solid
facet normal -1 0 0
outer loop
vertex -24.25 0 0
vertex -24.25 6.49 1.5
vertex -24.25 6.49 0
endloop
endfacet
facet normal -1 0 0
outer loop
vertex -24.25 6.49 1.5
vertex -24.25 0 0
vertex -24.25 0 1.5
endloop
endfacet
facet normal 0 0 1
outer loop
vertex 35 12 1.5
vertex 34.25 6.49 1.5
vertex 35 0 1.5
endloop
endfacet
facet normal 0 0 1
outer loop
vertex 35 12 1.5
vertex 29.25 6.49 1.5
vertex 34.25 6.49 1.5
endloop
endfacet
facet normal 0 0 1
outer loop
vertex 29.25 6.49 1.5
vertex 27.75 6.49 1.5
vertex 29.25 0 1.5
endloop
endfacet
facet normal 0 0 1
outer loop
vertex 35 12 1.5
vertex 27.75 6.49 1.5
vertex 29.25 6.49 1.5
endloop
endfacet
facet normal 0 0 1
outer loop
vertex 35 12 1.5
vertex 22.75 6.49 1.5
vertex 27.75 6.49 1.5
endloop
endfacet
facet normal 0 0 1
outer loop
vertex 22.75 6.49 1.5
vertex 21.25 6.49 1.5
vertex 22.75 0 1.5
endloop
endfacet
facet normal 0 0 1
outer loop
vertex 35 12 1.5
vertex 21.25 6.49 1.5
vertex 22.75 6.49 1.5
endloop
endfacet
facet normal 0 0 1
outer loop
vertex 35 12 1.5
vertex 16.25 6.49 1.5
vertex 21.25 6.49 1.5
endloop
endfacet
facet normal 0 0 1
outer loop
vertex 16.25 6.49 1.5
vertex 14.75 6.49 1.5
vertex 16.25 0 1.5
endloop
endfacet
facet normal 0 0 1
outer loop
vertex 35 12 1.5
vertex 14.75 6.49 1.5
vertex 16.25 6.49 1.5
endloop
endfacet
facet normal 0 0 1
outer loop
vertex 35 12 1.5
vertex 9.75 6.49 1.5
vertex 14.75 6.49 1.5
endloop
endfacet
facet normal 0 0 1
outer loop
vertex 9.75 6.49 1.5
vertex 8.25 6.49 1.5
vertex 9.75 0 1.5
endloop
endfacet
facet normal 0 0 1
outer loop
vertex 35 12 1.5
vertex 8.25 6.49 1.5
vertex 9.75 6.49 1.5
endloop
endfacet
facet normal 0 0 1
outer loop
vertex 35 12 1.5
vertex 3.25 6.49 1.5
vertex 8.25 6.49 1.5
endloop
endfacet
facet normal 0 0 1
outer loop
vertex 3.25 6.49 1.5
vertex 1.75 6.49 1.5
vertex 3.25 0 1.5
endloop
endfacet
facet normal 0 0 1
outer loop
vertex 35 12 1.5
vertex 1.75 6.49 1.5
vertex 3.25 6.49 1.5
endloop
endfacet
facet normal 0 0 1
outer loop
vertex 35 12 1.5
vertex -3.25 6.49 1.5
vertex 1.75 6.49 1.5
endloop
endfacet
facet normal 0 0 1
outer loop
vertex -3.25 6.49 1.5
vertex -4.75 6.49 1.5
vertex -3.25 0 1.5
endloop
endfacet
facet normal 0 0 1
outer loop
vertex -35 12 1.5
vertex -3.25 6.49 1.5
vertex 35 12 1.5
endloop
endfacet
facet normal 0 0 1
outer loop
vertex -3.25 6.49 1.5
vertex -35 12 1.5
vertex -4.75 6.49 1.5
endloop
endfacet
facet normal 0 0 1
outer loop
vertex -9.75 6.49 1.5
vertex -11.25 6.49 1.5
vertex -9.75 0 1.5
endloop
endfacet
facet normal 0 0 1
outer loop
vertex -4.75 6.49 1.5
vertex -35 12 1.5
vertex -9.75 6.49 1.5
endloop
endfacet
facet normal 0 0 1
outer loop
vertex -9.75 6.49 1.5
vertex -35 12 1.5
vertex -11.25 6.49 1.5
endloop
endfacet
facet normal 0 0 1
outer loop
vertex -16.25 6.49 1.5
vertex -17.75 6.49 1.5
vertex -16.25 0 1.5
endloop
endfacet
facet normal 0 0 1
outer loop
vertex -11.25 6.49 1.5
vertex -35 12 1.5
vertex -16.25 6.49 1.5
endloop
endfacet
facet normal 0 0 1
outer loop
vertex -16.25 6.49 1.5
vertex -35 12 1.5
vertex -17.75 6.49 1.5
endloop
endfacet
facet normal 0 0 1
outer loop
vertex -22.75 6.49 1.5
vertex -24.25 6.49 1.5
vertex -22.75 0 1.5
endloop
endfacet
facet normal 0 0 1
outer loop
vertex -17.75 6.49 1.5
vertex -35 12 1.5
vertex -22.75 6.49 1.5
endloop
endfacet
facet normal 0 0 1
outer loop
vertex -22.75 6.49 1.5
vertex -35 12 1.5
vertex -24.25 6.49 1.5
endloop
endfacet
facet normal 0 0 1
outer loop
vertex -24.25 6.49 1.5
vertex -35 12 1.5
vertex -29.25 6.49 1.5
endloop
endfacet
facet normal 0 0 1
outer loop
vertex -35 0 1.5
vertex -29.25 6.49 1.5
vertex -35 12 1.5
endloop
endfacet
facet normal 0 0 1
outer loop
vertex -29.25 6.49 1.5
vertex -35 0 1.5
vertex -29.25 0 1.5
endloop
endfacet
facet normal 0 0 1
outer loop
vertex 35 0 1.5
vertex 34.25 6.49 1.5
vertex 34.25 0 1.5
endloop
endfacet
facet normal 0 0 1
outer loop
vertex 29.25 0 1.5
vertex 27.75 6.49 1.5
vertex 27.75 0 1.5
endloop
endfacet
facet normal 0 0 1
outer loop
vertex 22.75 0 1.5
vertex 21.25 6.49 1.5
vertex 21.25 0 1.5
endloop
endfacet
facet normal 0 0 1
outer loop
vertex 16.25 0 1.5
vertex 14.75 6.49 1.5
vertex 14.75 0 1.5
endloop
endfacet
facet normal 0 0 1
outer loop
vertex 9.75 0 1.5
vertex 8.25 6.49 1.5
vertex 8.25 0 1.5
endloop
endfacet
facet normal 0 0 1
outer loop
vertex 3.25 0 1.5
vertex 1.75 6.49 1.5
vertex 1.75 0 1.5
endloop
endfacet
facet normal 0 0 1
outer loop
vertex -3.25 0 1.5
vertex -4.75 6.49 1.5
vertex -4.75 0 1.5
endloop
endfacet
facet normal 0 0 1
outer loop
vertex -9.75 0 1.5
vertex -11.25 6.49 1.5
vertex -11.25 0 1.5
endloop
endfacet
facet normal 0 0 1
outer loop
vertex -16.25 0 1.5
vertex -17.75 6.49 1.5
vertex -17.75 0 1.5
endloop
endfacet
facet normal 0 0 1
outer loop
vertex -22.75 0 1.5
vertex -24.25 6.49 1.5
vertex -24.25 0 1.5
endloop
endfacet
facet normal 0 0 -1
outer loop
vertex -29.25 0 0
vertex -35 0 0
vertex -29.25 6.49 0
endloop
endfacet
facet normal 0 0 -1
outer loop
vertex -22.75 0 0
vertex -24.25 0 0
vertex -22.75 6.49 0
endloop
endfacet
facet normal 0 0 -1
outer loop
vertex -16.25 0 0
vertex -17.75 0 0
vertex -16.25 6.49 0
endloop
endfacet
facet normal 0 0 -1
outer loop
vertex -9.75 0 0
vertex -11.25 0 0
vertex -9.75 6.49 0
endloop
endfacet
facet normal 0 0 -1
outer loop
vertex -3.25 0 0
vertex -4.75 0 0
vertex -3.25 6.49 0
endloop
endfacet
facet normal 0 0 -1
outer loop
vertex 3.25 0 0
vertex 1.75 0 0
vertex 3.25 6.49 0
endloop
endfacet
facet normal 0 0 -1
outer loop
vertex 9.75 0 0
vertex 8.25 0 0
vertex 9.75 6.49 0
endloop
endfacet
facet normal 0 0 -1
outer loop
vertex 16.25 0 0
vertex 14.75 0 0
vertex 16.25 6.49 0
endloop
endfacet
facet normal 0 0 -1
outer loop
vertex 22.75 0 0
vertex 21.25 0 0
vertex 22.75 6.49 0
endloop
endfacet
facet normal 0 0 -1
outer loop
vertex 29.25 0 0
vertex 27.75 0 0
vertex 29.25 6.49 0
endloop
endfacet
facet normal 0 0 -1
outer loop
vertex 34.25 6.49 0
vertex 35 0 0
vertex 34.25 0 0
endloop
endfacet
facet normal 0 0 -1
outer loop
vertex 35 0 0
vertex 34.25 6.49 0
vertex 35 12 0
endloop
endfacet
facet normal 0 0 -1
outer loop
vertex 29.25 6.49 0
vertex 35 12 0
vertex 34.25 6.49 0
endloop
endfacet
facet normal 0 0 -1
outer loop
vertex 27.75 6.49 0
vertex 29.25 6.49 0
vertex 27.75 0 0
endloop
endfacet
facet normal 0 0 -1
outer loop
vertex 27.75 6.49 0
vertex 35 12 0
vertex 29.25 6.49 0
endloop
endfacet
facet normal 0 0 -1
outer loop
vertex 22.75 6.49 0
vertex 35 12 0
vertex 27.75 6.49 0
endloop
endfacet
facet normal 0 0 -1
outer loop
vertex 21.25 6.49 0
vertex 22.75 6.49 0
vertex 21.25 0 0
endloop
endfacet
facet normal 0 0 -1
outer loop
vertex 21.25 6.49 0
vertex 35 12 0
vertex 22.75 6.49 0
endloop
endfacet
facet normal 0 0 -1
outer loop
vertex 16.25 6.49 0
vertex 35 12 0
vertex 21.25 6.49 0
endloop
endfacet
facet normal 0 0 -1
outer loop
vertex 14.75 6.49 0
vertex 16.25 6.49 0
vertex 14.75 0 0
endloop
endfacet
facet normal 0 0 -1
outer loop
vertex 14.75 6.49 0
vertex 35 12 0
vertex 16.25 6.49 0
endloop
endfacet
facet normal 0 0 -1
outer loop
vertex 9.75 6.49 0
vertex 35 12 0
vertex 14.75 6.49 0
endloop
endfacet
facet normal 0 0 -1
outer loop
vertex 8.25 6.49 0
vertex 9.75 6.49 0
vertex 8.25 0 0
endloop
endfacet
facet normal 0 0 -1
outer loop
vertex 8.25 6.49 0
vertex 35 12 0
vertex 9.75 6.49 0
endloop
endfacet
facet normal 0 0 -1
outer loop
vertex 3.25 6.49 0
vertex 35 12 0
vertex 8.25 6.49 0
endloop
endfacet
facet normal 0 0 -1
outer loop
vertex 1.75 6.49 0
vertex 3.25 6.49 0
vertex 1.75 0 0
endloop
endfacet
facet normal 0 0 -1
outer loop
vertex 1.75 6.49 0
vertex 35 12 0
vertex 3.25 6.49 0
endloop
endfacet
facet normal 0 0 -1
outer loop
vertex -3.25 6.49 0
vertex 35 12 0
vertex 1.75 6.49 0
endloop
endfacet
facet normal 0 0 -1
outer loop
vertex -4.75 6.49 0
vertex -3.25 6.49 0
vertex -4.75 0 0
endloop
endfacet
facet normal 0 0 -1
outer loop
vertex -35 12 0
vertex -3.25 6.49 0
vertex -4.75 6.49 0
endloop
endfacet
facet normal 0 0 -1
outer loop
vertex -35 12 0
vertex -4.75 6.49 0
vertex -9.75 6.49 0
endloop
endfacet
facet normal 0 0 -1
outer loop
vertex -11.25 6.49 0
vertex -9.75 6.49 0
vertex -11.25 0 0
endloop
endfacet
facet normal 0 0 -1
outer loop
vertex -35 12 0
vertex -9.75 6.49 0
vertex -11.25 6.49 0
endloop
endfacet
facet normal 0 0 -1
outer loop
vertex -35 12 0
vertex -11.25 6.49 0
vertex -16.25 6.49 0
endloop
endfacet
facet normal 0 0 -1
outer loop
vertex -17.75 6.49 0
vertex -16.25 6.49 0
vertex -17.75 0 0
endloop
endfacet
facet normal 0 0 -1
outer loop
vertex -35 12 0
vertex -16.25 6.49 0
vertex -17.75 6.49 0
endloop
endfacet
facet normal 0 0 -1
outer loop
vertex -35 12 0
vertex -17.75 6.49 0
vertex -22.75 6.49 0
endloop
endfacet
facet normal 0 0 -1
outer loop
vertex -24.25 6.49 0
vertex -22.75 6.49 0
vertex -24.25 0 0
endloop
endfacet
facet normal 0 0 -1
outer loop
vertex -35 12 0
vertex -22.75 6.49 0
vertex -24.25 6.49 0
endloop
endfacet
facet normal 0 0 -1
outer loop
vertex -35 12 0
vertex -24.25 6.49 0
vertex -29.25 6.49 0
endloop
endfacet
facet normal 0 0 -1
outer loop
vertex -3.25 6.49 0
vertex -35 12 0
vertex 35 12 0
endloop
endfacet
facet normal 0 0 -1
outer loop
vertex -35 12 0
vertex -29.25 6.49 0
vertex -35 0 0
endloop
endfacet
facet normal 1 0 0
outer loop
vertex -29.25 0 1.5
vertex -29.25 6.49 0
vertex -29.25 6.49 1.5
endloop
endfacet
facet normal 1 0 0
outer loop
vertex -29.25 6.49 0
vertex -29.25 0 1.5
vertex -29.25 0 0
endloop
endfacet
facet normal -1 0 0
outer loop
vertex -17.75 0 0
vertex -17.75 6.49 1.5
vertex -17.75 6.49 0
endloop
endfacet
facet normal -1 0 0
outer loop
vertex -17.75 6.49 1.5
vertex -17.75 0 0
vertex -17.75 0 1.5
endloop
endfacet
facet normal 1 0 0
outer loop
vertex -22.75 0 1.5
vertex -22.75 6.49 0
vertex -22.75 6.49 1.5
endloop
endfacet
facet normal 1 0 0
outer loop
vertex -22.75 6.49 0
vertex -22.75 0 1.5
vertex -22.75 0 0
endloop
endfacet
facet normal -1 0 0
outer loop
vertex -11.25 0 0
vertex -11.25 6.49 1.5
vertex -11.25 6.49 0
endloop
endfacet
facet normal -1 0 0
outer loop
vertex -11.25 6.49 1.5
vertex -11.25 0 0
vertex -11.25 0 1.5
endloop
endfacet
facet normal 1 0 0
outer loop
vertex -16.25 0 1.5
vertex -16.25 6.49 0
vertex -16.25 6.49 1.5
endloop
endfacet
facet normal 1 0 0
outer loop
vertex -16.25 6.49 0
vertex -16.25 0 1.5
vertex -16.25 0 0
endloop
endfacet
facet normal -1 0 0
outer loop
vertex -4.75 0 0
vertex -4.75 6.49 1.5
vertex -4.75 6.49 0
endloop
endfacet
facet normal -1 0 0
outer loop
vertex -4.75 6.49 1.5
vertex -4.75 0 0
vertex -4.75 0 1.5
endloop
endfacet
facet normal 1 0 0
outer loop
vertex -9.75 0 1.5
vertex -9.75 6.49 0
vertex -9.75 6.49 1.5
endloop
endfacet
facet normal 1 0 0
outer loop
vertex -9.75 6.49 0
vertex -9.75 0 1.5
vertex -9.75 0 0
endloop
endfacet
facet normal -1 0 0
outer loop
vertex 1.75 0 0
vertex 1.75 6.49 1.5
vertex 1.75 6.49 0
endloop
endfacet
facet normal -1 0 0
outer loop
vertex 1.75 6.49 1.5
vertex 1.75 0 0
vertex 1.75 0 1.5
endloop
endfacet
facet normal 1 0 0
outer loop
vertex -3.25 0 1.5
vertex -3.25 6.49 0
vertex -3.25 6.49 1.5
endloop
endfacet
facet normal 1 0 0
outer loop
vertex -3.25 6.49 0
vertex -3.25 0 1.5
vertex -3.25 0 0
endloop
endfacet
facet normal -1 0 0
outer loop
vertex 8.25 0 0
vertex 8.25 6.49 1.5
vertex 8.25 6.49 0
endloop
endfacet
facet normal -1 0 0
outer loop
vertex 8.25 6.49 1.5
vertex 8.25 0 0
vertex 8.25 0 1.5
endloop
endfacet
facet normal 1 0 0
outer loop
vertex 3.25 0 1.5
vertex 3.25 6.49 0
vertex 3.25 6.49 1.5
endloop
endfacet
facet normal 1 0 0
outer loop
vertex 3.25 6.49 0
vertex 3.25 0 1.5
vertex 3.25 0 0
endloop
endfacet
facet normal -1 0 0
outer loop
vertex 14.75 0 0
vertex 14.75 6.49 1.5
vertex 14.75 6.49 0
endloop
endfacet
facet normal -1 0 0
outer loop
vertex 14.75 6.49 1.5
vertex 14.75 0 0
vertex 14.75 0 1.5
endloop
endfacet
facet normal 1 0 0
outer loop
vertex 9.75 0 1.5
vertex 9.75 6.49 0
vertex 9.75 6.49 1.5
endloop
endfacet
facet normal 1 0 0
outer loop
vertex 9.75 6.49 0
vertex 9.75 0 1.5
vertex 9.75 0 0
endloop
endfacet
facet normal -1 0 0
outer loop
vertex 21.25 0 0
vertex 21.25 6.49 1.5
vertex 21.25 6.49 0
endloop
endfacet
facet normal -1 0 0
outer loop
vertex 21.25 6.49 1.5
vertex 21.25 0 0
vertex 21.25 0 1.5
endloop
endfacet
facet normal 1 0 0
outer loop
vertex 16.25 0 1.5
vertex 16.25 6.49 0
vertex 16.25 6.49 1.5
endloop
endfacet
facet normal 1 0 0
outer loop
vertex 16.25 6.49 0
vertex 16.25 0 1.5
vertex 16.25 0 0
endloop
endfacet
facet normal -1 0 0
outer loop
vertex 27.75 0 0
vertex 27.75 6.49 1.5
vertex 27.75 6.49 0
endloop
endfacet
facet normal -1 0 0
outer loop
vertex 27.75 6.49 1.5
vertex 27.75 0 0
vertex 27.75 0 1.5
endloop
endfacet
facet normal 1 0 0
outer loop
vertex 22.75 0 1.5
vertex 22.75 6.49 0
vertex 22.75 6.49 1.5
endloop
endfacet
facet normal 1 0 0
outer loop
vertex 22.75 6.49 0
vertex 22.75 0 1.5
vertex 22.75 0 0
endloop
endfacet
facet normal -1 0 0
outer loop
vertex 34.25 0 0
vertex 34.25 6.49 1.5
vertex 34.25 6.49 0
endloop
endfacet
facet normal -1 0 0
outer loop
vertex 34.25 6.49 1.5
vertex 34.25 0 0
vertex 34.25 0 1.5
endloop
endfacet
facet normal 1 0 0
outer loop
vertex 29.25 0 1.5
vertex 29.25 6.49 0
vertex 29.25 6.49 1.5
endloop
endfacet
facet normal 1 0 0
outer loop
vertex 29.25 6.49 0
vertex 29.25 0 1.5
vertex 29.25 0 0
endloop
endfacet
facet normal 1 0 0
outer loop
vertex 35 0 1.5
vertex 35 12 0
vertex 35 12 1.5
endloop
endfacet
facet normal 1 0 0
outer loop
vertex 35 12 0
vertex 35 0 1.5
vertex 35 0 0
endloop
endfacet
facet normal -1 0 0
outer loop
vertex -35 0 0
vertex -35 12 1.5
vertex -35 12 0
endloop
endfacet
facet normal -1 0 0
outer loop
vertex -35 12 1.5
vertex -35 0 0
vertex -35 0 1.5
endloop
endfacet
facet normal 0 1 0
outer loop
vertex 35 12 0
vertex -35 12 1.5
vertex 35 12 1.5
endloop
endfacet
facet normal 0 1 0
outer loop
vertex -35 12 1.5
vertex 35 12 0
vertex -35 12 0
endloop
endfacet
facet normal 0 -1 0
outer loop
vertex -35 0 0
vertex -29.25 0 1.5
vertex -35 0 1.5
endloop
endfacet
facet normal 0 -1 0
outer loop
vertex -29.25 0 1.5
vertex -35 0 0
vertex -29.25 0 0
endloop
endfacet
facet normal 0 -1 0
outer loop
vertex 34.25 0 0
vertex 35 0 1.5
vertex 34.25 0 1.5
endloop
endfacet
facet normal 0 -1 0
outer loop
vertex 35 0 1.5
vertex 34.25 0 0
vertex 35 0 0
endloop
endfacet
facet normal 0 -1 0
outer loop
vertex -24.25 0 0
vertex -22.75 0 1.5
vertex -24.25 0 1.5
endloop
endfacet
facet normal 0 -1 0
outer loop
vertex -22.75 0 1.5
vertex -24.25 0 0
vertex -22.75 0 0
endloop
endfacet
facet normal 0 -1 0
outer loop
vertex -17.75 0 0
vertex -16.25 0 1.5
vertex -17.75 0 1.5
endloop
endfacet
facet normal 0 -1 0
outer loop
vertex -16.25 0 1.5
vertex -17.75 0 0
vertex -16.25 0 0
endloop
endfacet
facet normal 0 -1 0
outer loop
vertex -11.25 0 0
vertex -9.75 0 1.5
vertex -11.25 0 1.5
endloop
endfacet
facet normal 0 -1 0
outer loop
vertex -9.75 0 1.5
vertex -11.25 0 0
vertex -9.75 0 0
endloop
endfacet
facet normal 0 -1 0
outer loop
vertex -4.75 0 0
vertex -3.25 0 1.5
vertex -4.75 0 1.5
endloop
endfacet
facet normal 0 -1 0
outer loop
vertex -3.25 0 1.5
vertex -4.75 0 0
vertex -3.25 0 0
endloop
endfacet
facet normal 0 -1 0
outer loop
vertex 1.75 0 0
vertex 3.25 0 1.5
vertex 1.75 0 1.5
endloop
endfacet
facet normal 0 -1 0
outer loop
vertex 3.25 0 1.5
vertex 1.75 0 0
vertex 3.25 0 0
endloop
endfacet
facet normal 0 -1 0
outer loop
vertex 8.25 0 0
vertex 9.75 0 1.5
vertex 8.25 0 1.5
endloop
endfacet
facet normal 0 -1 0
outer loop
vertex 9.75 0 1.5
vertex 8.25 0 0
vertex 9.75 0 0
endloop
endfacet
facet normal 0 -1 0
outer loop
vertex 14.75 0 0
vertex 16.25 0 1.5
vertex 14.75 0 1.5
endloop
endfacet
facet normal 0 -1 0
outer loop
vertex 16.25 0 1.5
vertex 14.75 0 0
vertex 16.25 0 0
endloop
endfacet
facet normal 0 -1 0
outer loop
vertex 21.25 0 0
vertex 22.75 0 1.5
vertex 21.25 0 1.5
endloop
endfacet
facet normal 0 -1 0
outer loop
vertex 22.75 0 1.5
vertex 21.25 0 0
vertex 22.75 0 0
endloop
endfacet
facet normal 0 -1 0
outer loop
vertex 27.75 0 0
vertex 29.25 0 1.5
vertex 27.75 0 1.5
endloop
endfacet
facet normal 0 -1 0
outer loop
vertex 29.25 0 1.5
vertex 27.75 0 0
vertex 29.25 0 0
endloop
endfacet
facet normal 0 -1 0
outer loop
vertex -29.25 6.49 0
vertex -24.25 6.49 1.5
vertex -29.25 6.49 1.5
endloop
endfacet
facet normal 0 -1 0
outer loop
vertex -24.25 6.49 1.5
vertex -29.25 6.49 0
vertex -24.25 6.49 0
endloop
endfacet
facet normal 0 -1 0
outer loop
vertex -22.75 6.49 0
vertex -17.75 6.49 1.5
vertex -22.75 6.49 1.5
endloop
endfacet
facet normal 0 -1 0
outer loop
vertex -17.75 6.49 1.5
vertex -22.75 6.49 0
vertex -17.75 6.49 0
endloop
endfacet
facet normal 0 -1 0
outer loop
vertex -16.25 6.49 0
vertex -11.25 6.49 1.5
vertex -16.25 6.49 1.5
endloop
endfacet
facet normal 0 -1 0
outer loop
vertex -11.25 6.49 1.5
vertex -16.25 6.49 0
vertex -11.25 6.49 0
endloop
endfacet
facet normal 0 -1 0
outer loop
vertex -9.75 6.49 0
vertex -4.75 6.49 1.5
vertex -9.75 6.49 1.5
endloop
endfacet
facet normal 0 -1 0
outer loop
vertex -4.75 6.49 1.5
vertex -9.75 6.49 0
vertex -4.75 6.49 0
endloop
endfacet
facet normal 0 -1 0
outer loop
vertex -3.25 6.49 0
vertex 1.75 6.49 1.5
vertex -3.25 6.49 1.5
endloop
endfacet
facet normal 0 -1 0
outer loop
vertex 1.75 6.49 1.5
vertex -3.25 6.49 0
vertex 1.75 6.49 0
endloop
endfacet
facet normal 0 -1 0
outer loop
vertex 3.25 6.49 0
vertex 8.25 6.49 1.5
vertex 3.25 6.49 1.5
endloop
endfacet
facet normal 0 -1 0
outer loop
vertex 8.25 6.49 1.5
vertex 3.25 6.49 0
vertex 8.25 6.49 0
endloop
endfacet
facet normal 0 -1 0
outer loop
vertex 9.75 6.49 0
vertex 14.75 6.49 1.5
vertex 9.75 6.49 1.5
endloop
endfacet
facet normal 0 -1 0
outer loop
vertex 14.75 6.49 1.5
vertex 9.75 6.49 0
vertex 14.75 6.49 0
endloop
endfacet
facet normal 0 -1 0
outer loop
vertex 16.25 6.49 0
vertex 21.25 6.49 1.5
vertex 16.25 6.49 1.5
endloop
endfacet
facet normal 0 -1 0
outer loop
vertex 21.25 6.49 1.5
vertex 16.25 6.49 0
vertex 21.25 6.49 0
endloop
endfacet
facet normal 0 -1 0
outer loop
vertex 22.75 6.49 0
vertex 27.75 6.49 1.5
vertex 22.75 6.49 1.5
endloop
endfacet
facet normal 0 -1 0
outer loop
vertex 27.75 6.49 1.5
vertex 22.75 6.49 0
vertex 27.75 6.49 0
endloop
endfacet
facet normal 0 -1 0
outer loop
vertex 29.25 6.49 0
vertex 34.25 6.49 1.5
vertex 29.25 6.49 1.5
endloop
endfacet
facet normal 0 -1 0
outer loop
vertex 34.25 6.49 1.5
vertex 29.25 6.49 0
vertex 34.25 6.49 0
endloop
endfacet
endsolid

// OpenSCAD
// 10-well comb for agarose gel casting, printed lying flat
// Units: mm

// ---- Spine ----
spine_len   = 70;    // spine length (X)
spine_wid   = 12;    // spine width (Y)

// ---- Teeth ----
tooth_count = 10;    // number of teeth
tooth_w     = 5.0;   // tooth width (X)
tooth_l     = 12;    // tooth length (Y)

// ---- Pitch ----
pitch       = 1.5;   // gap between tooth centres (X)

// ---- Plate ----
plate_t     = 1.5;   // plate thickness (Z)

// ---- Misc ----
eps         = 0.5;   // cutter overshoot

$fn = 64;

tooth_wid = tooth_w + pitch;   // centre-to-centre spacing

difference() {
    union() {
        // Spine
        translate([-spine_len/2, 0, 0])
            cube([spine_len, spine_wid, plate_t]);

        // Teeth
        for (i = [0 : tooth_count - 1])
            translate([(i - (tooth_count - 1)/2) * tooth_wid,
                       -spine_wid/2 - eps,
                       0])
                cube([tooth_w, tooth_l, plate_t]);
    }

    // Cut out the wells (through the full plate)
    for (i = [0 : tooth_count - 1])
        translate([(i - (tooth_count - 1)/2) * tooth_wid,
                   -spine_wid/2 - eps - 0.01,
                   -eps])
            cube([tooth_w, tooth_l + 2*eps, 2*eps + plate_t + 0.02]);
}
